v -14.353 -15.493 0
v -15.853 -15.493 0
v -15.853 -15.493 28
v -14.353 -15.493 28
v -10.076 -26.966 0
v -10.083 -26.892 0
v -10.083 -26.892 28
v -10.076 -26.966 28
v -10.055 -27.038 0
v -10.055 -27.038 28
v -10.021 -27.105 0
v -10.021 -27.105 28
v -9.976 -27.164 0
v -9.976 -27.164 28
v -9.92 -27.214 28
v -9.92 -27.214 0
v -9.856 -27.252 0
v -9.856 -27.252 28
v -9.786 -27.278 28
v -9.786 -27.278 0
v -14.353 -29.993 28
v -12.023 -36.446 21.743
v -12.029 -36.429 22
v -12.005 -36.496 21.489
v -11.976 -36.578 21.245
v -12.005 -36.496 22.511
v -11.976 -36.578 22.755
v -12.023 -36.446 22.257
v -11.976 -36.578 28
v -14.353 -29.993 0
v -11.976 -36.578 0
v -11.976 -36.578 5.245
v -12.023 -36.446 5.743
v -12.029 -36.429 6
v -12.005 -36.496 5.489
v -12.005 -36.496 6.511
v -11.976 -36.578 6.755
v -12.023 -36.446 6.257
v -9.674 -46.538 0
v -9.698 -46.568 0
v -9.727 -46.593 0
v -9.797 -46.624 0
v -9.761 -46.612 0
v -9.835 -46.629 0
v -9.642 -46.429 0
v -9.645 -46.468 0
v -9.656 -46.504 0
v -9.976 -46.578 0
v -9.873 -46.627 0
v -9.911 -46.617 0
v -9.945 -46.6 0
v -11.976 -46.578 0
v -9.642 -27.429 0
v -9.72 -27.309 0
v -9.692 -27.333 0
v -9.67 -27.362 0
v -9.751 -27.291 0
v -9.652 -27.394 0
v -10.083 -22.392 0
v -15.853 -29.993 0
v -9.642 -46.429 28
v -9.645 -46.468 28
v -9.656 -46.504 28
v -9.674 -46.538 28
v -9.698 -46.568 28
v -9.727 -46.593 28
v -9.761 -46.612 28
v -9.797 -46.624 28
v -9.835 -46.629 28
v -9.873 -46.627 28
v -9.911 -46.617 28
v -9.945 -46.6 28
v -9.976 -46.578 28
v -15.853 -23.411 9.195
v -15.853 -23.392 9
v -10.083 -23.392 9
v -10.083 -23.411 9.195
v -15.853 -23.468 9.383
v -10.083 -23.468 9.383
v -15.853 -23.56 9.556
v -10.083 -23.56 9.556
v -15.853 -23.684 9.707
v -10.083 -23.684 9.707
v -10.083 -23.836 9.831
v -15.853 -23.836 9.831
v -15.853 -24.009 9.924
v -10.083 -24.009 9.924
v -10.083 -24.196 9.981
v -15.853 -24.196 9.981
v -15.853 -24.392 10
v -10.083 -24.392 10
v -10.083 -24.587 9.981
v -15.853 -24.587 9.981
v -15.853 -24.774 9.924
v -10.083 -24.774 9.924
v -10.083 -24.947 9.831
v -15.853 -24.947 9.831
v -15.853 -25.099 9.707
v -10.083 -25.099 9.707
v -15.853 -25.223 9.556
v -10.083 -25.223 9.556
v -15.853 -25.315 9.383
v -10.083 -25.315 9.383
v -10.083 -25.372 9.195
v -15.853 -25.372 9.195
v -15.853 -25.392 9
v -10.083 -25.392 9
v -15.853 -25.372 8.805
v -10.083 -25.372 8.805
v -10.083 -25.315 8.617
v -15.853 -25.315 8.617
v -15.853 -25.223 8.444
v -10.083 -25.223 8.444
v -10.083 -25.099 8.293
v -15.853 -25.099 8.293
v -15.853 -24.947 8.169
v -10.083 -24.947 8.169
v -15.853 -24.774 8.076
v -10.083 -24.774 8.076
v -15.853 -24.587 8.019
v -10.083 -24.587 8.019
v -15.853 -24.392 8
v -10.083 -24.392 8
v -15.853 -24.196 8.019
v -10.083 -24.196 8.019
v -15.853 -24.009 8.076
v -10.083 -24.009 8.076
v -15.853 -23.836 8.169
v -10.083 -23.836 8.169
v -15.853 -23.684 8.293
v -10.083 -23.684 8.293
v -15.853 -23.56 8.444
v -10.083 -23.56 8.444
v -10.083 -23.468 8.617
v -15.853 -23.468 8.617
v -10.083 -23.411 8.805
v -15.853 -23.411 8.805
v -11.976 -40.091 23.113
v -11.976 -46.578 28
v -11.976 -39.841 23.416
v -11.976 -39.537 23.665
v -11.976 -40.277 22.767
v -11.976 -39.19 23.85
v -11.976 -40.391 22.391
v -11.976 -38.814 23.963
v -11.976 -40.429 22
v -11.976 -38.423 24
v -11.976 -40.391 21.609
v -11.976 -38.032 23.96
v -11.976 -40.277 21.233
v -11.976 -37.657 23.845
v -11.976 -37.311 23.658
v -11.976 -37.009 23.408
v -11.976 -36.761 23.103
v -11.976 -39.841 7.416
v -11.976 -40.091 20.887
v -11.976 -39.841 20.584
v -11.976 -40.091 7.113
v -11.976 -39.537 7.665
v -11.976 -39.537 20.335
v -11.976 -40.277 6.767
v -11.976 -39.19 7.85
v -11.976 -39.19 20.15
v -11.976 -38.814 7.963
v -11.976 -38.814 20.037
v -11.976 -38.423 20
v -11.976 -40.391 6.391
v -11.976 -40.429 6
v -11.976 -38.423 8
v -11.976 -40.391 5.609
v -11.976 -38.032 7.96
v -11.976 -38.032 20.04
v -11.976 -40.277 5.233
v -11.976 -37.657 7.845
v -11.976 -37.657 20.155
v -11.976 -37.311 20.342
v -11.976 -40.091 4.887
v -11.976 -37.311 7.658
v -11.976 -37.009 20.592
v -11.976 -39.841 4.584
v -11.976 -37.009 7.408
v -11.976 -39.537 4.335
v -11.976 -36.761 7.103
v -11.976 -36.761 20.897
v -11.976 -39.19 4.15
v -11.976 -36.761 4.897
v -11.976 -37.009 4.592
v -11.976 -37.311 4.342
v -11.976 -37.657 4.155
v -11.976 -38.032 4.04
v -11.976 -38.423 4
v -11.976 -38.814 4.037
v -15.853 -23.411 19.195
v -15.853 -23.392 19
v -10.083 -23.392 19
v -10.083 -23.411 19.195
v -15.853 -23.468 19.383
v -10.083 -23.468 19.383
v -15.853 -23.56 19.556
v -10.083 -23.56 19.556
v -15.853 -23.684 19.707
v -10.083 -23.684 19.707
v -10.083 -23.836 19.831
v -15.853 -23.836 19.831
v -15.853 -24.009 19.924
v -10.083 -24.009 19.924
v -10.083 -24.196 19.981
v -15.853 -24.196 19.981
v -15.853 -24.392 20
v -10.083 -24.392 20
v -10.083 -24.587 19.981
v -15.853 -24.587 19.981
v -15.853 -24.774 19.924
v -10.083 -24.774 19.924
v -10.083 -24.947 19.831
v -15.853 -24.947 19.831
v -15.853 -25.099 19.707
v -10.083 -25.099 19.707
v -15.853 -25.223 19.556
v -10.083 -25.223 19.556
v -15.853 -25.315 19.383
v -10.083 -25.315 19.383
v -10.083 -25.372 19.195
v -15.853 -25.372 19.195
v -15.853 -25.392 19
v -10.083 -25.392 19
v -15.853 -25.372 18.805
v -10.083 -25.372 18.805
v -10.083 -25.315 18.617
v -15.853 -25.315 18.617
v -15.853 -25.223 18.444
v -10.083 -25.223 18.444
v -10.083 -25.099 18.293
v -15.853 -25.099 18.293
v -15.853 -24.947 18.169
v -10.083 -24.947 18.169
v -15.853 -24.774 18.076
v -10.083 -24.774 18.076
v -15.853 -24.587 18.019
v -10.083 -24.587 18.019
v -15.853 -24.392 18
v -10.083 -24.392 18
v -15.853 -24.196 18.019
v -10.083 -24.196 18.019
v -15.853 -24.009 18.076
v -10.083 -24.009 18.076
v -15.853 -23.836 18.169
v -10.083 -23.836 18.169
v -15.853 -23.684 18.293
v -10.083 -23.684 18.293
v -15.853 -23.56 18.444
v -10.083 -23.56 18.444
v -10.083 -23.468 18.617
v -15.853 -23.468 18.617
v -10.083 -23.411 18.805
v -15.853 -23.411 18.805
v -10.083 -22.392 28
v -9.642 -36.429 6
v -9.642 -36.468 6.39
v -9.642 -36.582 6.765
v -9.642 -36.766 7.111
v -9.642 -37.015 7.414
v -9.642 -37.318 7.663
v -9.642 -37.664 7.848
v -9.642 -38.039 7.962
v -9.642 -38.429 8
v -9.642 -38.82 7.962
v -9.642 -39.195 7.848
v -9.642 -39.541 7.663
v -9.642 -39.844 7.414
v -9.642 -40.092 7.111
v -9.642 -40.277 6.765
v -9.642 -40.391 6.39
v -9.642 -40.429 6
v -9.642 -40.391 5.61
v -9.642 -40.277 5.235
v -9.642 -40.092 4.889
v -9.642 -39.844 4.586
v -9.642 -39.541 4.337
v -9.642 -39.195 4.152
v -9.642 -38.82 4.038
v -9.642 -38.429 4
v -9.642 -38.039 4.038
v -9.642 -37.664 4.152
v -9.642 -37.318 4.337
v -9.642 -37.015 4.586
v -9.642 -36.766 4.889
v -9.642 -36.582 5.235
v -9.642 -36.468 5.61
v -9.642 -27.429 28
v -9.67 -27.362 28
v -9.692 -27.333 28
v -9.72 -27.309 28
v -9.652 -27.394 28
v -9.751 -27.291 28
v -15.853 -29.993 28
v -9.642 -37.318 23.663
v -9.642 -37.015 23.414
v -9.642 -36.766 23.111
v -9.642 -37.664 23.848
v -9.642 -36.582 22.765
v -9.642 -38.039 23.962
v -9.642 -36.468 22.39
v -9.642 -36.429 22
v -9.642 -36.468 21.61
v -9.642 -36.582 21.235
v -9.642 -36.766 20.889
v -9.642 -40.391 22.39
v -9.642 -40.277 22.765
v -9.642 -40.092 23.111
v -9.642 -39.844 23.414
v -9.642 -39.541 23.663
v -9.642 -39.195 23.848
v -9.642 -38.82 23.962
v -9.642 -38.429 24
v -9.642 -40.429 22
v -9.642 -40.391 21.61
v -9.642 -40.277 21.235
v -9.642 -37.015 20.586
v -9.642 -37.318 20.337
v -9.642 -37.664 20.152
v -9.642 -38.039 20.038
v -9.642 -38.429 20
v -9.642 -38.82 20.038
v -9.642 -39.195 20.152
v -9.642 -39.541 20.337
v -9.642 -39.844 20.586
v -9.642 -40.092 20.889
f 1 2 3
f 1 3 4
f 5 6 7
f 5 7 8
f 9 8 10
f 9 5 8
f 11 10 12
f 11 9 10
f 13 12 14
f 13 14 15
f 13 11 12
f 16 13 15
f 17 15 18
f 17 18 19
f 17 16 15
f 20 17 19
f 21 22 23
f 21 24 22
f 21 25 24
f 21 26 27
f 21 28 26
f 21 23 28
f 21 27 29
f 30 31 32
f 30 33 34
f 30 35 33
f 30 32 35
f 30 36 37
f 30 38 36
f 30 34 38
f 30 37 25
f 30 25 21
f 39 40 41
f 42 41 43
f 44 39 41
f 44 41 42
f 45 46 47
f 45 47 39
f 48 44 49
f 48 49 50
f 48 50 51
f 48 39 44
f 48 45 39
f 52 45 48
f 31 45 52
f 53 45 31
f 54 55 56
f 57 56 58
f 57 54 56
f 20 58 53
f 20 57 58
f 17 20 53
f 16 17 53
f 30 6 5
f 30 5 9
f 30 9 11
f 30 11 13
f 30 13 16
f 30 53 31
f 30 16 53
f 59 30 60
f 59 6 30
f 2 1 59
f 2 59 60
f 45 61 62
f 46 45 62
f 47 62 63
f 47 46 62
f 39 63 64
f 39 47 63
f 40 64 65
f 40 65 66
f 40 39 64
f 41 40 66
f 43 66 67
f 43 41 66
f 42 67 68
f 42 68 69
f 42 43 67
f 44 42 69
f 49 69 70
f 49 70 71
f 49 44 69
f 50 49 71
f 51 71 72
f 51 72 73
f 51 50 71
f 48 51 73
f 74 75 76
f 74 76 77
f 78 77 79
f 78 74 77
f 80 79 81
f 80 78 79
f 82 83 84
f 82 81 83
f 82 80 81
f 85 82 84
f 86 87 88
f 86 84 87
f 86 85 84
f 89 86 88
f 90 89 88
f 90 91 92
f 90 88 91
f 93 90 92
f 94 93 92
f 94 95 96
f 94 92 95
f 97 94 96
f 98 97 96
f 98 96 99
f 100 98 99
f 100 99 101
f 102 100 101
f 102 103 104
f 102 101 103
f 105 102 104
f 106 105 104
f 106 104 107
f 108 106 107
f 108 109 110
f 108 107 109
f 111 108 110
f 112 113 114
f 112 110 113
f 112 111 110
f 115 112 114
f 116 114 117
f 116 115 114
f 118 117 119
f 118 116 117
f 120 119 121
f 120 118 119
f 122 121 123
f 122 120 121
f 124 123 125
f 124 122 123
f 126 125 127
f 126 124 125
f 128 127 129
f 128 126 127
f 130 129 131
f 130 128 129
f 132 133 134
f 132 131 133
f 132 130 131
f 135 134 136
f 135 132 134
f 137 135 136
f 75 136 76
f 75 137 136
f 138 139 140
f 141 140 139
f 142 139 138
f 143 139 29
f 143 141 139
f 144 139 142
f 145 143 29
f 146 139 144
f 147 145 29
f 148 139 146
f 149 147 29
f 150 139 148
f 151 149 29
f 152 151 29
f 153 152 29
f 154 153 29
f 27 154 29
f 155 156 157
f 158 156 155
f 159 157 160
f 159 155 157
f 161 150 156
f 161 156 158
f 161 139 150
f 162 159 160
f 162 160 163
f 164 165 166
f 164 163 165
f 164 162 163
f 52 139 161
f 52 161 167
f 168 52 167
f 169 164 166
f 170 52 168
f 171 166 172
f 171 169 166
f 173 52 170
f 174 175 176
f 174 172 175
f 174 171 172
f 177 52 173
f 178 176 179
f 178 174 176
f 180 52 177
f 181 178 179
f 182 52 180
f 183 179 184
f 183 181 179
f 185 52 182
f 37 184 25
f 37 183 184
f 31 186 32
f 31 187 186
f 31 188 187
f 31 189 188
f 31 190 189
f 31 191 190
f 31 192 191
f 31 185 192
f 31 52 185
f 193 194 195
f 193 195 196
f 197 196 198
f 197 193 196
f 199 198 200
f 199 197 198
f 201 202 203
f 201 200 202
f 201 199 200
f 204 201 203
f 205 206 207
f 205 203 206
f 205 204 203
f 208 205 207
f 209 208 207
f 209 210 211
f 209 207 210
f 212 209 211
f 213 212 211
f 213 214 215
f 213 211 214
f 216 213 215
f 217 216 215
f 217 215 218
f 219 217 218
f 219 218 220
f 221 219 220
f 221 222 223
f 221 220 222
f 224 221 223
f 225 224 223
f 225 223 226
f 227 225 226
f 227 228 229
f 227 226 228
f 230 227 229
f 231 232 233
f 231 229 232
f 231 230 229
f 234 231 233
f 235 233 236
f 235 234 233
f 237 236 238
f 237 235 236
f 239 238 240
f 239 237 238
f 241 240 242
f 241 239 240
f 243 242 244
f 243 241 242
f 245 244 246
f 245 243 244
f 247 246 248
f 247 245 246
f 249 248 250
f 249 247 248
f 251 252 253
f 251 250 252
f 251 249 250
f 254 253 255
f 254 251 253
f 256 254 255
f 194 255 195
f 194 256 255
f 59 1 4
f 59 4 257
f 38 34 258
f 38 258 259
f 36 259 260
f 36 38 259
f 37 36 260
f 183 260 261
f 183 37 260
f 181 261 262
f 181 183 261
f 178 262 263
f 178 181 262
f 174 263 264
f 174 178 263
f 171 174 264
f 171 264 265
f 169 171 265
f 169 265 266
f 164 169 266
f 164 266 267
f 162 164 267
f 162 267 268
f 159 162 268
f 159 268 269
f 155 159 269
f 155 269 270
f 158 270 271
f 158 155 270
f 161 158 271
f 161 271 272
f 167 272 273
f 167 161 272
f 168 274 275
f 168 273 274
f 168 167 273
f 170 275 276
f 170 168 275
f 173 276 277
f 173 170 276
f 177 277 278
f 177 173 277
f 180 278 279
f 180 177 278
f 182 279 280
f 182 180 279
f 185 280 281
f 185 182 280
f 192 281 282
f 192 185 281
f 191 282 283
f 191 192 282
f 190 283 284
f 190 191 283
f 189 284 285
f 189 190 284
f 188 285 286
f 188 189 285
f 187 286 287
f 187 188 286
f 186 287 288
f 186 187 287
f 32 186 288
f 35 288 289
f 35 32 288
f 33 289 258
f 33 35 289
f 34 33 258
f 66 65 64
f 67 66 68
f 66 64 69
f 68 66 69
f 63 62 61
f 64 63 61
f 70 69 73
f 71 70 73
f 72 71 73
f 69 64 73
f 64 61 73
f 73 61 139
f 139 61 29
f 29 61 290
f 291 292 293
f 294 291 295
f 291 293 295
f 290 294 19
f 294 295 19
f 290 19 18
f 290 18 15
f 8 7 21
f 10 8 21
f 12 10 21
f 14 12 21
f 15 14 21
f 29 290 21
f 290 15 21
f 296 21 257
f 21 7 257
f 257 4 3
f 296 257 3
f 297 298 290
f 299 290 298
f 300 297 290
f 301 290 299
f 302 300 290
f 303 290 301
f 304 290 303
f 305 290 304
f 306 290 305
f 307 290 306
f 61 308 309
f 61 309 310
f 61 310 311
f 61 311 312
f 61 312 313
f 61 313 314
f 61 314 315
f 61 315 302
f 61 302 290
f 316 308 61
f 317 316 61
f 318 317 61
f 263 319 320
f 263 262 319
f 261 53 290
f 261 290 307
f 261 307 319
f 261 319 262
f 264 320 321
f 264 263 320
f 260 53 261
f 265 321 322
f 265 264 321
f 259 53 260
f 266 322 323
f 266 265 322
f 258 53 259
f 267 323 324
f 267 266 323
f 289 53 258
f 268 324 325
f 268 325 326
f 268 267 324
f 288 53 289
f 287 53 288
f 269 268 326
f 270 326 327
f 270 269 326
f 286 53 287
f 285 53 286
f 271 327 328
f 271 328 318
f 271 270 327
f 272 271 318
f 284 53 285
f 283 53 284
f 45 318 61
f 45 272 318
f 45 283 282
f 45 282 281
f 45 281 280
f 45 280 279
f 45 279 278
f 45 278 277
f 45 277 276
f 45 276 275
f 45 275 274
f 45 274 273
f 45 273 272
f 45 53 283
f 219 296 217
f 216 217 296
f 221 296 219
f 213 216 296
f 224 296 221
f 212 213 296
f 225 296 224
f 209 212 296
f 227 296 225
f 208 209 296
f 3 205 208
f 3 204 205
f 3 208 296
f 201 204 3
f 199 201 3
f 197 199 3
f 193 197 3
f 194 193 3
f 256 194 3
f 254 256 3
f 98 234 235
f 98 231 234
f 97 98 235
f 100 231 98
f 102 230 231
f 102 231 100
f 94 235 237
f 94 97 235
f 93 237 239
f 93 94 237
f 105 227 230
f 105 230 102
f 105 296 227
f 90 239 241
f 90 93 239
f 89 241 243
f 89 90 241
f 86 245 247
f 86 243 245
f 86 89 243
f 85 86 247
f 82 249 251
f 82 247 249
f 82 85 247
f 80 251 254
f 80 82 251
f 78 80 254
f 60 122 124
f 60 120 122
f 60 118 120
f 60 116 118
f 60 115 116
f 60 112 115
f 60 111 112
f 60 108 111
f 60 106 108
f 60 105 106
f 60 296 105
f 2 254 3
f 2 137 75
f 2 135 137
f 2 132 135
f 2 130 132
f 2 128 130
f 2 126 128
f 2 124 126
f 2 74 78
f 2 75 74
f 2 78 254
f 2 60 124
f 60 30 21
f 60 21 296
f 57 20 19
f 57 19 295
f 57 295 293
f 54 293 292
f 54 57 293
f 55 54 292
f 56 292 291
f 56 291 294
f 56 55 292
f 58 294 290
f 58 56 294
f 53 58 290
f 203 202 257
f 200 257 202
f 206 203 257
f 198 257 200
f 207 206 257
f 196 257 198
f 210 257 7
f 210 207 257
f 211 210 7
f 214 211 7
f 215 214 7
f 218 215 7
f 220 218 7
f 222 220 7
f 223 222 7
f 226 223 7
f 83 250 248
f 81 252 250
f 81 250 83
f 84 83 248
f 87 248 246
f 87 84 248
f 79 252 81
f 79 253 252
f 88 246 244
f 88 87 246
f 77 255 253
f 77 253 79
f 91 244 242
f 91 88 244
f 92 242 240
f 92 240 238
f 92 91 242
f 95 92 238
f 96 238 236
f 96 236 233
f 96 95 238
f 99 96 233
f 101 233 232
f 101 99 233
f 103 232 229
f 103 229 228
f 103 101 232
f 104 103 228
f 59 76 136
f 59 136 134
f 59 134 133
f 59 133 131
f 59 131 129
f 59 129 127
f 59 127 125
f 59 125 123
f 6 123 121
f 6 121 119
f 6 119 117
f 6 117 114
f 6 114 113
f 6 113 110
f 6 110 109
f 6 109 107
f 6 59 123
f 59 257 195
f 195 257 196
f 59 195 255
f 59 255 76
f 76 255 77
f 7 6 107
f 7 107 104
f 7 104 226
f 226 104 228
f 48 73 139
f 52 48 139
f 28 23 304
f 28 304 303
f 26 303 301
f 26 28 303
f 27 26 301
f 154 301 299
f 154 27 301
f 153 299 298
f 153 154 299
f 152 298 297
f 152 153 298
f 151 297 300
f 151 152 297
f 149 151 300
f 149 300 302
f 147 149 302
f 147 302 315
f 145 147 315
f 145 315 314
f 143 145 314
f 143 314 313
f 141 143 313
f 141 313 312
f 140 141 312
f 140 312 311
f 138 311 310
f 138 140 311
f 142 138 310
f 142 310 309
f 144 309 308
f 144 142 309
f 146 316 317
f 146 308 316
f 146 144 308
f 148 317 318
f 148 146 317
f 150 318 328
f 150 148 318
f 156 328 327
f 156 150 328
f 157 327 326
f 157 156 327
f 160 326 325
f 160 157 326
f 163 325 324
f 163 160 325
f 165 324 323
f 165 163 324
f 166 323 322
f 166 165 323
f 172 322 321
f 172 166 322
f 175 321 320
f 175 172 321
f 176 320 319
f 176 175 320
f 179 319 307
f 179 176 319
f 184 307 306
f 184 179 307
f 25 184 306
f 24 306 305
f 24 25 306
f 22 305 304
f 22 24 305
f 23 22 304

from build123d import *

# Parameters (mm, degrees)
EXTRUDE_2_DEPTH          = 28
CUT_EXTRUDE_3_DEPTH      = 55.695457471
CUT_EXTRUDE_3_DEPTH_BACK = 55.695457471
SKETCH_2_R               = 1
SKETCH_2_R_2             = 2


with BuildPart() as part:
    # 草图1 → 凸台-拉伸2 (new body)
    with BuildSketch(Plane.XY):
        with BuildLine():
            Line((-15.852639514, -15.493363478), (-14.352639514, -15.493363478))
            Line((-14.352639514, -15.493363478), (-10.082641686, -22.391510936))
            Line((-10.082641686, -22.391510936), (-10.082641686, -26.891510936))
            ThreePointArc((-10.082641686, -26.891510936), (-9.999818758, -27.135229432), (-9.78564816, -27.27802053))
            ThreePointArc((-9.78564816, -27.27802053), (-9.692275449, -27.33339509), (-9.641586108, -27.429391944))
            Line((-9.641586108, -27.429391944), (-9.641586108, -46.429391944))
            ThreePointArc((-9.641586108, -46.429391944), (-9.760568765, -46.612247597), (-9.975948009, -46.577536736))
            Line((-9.975948009, -46.577536736), (-10.975948009, -46.577536736))
            Line((-10.975948009, -46.577536736), (-11.975948009, -46.577536736))
            Line((-11.975948009, -46.577536736), (-11.975948009, -36.577536736))
            Line((-11.975948009, -36.577536736), (-14.352639514, -29.993363478))
            Line((-14.352639514, -29.993363478), (-15.852639514, -29.993363478))
            Line((-15.852639514, -29.993363478), (-15.852639514, -15.493363478))
        make_face()
    extrude(amount=EXTRUDE_2_DEPTH)

    # 草图2 → 切除-拉伸3 (cut, two sides: drawn at the far end of the back side and taken through both)
    with BuildSketch(Plane(origin=(-10.082641686, 0, 0), x_dir=(0, 0, -1), z_dir=(1, 0, 0)).offset(-CUT_EXTRUDE_3_DEPTH_BACK)):
        with Locations(Location((-19, -24.391510936, 0), (0, 0, 90))):
            Circle(SKETCH_2_R)
        with Locations(Location((-22, -38.429391944, 0), (0, 0, 90))):
            Circle(SKETCH_2_R_2)
        with Locations(Location((-6, -38.429391944, 0), (0, 0, 90))):
            Circle(SKETCH_2_R_2)
        with Locations(Location((-9, -24.391510936, 0), (0, 0, 90))):
            Circle(SKETCH_2_R)
    extrude(amount=CUT_EXTRUDE_3_DEPTH + CUT_EXTRUDE_3_DEPTH_BACK, mode=Mode.SUBTRACT)


solid = part.part
